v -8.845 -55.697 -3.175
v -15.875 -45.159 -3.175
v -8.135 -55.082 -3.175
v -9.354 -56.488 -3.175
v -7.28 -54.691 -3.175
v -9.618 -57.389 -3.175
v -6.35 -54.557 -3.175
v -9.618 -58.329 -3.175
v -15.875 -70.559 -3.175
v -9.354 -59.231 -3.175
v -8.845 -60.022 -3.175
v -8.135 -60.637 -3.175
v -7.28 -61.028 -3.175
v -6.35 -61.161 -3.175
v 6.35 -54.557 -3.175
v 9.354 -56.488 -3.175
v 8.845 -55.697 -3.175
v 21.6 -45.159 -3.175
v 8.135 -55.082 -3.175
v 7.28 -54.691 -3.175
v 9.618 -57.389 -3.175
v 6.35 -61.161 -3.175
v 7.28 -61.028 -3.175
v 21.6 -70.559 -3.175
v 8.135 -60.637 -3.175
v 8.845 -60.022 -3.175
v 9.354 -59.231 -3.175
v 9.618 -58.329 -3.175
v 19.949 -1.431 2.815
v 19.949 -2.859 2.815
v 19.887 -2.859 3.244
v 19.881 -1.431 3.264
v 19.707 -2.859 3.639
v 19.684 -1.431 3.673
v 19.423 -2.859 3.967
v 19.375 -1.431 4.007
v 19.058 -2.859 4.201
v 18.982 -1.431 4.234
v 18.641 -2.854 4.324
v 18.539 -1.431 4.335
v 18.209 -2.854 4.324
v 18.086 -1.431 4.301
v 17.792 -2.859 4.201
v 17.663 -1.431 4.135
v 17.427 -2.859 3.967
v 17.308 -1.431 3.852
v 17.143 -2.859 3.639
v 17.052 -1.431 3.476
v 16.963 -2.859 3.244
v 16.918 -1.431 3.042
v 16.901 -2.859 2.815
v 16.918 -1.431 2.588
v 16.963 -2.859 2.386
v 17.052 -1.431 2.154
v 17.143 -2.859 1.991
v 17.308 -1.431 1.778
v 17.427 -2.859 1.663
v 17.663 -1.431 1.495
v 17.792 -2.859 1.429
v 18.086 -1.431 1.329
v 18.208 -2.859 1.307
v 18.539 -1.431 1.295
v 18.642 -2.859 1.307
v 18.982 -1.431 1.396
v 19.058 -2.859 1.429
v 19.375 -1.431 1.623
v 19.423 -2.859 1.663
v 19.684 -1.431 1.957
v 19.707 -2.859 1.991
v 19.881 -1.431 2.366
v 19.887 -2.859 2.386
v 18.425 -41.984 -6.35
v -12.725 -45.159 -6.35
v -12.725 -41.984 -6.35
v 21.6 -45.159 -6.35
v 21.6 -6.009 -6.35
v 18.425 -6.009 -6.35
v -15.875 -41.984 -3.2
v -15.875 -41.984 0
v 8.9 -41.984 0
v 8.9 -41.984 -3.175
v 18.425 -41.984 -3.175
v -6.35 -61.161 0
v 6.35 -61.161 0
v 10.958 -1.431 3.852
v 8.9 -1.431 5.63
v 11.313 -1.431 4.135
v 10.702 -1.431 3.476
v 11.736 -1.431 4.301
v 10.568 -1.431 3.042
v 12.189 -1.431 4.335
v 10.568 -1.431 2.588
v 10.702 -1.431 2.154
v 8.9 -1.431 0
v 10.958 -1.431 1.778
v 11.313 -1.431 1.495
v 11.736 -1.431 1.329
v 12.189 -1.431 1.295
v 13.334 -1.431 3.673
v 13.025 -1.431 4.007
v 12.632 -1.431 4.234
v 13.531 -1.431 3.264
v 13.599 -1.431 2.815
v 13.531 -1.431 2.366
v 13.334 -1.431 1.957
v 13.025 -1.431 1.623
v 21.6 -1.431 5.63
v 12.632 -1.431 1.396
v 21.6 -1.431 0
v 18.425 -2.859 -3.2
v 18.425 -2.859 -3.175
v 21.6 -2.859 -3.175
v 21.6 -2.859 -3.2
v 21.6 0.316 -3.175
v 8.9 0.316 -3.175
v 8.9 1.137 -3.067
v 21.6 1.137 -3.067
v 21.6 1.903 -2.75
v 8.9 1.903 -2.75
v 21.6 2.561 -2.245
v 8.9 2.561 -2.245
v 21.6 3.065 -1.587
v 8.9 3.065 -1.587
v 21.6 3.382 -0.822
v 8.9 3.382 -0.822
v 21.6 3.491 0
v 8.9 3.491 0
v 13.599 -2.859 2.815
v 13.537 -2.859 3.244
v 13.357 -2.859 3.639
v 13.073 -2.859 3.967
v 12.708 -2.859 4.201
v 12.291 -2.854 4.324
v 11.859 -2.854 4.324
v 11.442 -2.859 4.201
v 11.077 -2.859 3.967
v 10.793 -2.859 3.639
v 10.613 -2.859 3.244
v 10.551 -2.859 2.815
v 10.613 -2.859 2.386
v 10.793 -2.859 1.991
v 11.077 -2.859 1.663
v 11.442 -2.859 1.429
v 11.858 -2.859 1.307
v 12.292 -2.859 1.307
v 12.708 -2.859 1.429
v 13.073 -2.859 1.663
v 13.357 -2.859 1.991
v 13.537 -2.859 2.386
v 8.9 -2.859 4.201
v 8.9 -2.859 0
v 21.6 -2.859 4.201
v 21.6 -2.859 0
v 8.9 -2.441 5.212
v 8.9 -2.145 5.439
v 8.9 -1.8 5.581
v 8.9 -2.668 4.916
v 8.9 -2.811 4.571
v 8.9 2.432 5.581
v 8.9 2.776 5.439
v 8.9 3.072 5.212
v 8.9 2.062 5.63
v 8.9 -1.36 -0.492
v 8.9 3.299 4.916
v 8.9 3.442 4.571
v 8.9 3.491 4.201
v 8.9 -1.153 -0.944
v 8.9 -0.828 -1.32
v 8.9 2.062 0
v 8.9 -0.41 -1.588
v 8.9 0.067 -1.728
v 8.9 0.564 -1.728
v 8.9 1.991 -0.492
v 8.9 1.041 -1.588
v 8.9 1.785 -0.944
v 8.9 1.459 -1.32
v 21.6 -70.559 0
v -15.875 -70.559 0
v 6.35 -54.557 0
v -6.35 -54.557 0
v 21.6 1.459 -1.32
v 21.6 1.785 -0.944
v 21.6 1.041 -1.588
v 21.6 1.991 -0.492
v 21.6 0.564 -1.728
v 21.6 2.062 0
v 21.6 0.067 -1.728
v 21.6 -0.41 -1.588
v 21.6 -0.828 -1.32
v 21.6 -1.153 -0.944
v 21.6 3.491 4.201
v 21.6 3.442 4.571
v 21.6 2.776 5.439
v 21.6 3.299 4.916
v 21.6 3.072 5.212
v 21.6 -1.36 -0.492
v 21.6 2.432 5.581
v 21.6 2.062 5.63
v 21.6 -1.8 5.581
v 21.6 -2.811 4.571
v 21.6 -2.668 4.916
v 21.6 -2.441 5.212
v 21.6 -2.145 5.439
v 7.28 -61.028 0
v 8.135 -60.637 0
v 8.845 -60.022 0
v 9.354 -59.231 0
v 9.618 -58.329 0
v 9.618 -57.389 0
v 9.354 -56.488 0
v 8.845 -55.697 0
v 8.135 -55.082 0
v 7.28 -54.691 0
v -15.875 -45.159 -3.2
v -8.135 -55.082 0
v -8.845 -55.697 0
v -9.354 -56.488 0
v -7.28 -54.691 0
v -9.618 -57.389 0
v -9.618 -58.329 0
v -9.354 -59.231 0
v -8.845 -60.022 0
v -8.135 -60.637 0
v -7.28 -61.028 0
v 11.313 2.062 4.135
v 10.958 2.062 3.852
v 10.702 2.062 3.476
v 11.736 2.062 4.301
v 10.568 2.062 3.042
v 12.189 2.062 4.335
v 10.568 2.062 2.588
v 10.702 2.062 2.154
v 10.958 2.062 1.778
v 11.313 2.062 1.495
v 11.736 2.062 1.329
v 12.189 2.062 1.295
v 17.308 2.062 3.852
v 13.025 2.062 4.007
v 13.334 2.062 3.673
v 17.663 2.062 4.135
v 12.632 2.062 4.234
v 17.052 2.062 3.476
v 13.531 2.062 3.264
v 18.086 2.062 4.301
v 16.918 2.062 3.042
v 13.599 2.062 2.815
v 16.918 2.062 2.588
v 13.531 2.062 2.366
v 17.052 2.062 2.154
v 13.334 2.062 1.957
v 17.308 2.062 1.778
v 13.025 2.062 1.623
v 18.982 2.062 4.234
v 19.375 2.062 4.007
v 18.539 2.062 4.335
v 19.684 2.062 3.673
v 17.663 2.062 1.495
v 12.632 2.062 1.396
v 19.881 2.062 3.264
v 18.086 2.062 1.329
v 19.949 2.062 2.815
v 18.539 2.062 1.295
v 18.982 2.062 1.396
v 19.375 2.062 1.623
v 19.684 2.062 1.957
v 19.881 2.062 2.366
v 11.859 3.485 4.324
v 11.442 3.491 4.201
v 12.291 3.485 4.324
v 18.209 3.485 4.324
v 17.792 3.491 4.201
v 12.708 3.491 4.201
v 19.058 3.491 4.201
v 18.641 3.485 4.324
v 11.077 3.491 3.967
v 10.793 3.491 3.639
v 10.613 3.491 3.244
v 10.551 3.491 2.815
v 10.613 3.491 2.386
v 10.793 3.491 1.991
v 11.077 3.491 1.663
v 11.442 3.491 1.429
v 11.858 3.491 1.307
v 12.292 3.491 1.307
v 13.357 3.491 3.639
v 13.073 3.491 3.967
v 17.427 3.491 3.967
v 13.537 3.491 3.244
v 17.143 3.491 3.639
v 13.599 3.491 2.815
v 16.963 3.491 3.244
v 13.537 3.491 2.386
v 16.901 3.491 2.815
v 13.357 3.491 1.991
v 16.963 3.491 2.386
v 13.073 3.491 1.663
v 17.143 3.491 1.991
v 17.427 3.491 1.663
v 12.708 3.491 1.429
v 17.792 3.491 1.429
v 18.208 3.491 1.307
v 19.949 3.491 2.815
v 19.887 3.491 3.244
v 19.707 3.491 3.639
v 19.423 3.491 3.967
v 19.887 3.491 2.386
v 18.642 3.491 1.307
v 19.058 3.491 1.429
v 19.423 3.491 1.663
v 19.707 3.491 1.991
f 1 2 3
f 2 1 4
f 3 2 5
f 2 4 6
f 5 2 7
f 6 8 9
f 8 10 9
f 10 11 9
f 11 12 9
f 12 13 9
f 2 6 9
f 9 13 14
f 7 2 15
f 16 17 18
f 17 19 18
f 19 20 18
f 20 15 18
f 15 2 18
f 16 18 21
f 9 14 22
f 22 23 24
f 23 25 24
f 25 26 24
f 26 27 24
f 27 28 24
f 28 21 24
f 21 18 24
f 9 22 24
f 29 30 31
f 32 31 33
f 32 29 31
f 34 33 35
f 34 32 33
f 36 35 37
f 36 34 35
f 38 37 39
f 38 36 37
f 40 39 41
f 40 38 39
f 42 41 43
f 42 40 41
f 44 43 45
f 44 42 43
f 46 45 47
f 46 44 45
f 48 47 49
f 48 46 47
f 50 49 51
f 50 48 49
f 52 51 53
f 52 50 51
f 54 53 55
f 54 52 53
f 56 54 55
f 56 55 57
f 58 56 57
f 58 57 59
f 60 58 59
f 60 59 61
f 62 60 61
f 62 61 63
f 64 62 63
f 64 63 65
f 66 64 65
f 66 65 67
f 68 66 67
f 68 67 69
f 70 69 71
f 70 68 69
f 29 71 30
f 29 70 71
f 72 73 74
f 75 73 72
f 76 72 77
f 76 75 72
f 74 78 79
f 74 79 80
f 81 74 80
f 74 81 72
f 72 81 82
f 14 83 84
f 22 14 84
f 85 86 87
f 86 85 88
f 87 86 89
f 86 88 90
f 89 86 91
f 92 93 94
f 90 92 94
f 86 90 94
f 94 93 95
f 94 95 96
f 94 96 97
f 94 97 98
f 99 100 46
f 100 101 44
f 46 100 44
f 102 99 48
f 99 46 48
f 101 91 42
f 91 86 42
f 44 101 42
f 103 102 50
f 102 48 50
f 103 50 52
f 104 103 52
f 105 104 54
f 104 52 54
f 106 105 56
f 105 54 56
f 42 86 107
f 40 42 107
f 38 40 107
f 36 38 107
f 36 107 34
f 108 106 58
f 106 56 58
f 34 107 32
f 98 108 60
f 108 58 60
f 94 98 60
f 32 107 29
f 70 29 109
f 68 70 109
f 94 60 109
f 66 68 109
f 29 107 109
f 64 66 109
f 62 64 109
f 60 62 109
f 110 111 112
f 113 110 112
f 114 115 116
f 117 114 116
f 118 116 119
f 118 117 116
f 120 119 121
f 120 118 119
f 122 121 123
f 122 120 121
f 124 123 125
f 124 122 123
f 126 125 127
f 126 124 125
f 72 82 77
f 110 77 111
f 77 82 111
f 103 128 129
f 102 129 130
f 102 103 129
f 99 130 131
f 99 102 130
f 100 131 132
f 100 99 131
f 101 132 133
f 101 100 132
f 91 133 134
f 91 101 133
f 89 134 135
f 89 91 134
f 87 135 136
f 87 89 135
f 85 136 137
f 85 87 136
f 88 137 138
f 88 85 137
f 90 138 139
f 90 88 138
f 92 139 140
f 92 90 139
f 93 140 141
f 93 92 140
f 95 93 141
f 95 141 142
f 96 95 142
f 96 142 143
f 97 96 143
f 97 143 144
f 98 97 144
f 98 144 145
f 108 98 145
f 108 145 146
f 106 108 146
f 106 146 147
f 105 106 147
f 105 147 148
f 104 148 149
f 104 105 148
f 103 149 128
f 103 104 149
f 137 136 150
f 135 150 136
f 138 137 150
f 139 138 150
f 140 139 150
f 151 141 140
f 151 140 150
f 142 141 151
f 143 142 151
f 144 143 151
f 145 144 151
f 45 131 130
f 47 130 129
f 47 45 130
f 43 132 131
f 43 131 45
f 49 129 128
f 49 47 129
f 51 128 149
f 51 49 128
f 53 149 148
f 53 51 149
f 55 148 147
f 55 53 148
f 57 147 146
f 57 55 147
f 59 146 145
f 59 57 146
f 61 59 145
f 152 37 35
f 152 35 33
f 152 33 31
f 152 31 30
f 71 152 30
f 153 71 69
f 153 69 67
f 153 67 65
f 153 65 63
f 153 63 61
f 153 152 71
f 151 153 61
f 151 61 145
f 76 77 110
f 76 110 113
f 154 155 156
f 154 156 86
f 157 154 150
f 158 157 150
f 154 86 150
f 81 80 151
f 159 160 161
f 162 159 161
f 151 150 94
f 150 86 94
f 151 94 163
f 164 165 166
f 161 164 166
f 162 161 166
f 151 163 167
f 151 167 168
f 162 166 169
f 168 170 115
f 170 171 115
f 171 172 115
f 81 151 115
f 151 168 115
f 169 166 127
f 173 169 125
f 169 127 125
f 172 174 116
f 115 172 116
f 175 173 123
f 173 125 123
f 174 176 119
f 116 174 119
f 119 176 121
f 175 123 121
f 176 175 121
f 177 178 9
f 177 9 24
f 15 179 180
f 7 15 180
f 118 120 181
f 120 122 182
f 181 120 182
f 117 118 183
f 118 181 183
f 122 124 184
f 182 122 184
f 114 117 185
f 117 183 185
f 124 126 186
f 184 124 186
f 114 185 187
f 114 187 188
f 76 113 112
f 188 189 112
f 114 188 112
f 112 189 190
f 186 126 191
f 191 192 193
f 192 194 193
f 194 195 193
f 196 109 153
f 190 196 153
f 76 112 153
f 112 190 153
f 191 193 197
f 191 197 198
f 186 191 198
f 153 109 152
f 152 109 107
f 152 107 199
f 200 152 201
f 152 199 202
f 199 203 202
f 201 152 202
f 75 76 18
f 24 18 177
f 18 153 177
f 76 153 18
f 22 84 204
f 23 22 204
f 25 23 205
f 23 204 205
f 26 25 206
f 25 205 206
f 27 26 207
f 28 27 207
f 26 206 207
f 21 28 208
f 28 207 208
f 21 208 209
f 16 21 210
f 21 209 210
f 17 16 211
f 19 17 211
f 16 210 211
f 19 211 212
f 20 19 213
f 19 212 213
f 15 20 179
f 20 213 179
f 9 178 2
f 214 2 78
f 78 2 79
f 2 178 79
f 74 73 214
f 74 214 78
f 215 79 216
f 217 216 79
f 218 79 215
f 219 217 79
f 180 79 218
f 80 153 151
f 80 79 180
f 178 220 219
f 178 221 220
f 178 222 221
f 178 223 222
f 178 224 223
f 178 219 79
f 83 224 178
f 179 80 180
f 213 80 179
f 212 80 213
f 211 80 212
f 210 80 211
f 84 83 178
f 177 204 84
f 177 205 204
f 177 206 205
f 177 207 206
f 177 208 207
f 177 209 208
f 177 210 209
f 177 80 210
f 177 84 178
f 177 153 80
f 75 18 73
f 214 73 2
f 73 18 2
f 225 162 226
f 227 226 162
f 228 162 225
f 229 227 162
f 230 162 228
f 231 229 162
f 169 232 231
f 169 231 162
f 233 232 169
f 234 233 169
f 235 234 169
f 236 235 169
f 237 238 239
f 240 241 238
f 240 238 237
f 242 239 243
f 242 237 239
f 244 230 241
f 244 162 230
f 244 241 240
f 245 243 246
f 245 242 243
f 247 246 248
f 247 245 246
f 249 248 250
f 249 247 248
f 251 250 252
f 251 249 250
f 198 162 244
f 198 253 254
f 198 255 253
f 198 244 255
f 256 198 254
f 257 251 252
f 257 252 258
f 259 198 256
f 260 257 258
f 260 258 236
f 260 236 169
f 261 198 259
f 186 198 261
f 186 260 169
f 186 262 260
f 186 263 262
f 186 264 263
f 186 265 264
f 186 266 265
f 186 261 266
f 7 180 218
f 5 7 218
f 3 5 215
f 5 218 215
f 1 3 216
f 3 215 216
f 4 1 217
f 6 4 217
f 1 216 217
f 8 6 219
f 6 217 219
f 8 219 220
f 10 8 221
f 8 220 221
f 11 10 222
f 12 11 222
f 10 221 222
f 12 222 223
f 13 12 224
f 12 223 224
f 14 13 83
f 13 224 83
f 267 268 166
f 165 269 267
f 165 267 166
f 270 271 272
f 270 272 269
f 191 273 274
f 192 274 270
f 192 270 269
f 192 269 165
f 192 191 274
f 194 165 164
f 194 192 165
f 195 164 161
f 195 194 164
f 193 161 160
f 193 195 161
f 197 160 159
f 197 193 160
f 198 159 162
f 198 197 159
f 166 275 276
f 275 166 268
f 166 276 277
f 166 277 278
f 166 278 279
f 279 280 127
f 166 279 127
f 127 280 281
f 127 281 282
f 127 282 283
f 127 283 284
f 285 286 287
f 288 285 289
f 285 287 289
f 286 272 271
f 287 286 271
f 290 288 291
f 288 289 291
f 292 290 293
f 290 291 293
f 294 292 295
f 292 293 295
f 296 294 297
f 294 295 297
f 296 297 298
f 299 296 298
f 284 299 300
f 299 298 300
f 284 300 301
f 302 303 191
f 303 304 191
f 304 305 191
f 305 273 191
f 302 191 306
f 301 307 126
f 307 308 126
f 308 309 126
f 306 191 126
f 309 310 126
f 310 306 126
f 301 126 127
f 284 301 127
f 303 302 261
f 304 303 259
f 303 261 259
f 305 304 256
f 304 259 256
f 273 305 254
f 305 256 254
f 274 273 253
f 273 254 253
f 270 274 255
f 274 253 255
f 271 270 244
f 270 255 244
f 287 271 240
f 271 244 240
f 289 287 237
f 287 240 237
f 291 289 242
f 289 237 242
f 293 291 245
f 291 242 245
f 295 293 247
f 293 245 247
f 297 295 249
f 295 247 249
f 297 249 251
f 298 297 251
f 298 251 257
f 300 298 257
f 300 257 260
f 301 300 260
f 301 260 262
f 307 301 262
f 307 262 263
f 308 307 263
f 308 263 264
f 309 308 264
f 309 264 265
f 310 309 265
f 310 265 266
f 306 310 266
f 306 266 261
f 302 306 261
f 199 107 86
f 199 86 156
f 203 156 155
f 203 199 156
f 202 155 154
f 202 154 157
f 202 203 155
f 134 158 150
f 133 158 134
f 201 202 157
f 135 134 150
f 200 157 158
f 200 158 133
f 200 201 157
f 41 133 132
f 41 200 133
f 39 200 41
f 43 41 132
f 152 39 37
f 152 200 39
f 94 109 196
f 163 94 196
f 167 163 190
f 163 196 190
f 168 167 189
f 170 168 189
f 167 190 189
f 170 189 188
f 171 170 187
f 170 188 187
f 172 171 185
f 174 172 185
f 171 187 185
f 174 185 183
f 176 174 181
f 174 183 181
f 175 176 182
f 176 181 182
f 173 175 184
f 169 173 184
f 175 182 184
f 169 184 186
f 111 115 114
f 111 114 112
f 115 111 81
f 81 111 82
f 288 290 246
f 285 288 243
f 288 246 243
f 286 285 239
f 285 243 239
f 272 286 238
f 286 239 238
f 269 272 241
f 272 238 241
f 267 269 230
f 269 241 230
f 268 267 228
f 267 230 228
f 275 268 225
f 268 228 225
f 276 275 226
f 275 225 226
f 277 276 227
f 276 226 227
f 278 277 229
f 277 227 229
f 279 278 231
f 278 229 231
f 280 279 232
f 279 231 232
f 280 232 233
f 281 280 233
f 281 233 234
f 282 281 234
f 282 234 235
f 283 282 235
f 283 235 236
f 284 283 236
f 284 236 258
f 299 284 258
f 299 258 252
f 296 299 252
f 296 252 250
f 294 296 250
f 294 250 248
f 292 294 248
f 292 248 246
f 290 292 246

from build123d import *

# Parameters (mm, degrees)
PAD003_DEPTH         = 6.35
SKETCH015_R          = 1.524
POCKET003_DEPTH      = 4.7635
POCKET003_DEPTH_BACK = 1.5885
SKETCH016_W          = 3.175
SKETCH016_H          = 12.7
PAD008_DEPTH         = 67.7
SKETCH025_W          = 28.575
SKETCH025_H          = 24.775
PAD009_DEPTH         = 3.175
POCKET007_DEPTH      = 5.175996
PAD010_DEPTH         = 3.175
CHAMFER001_SIZE      = 3.1496


with BuildPart() as part:
    # Sketch014 → Pad003 (new body, symmetric)
    with BuildSketch(Plane.YZ.offset(15.25)):
        with BuildLine():
            ThreePointArc((-1.430625, 0), (0.315625, -1.74625), (2.061875, 0))
            Line((2.061875, 5.63), (2.061875, 0))
            ThreePointArc((3.490625, 4.20125), (3.072154, 5.211529), (2.061875, 5.63))
            Line((3.490625, 4.20125), (3.490625, 0))
            ThreePointArc((0.315625, -3.175), (2.560689, -2.245064), (3.490625, 0))
            Line((-2.859375, -3.175), (0.315625, -3.175))
            Line((-2.859375, 4.20125), (-2.859375, -3.175))
            ThreePointArc((-1.430625, 5.63), (-2.440904, 5.211529), (-2.859375, 4.20125))
            Line((-1.430625, 5.63), (-1.430625, 0))
        make_face()
    extrude(amount=PAD003_DEPTH, both=True)

    # Sketch015 (on Face72 of LinearPattern001) → Pocket003 (cut, two sides)
    with BuildSketch(Plane.XZ.offset(1.271875)) as pocket003_sk:
        with Locations((12.075, 2.815)):
            Circle(SKETCH015_R)
        with Locations((18.425, 2.815)):
            Circle(SKETCH015_R)
    extrude(amount=-POCKET003_DEPTH, mode=Mode.SUBTRACT)
    extrude(pocket003_sk.sketch, amount=POCKET003_DEPTH_BACK, mode=Mode.SUBTRACT)

    # Sketch016 (on Face8 of Pocket003) → Pad008 (join)
    with BuildSketch(Plane(origin=(15.25, -2.859375, 0), x_dir=(0, 0, -1), z_dir=(0, -1, 0))):
        with Locations((1.5875, 0)):
            Rectangle(SKETCH016_W, SKETCH016_H)
    extrude(amount=PAD008_DEPTH)

    # Sketch025 (on Face16 of Pad008) → Pad009 (join)
    with BuildSketch(Plane(origin=(15.25, 0, 0), x_dir=(0, -1, 0), z_dir=(0, 0, 1))):
        with Locations((56.271875, -18.7375)):
            Rectangle(SKETCH025_W, SKETCH025_H)
    extrude(amount=-PAD009_DEPTH)

    # Sketch026 (on Face29 of Pad015) → Pocket007 (cut, through all)
    with BuildSketch(Plane(origin=(15.25, 0, 1.999996), x_dir=(0, -1, 0), z_dir=(0, 0, 1))):
        with BuildLine():
            ThreePointArc((61.161375, -8.9), (57.859375, -5.598), (54.557375, -8.9))
            Line((54.557375, -8.9), (54.557375, -21.6))
            ThreePointArc((54.557375, -21.6), (57.859375, -24.902), (61.161375, -21.6))
            Line((61.161375, -21.6), (61.161375, -8.9))
        make_face()
    extrude(amount=-POCKET007_DEPTH, mode=Mode.SUBTRACT)

    # Sketch027 (on Face24 of Pocket007) → Pad010 (join)
    with BuildSketch(Plane(origin=(15.25, 0, -3.175), x_dir=(0, 1, 0), z_dir=(0, 0, -1))):
        Polygon((-2.859375, 6.35), (-45.159375, 6.35), (-45.159375, -31.125), (-41.984375, -31.125), (-41.984375, 3.175), (-2.859375, 3.175), align=None)
    extrude(amount=PAD010_DEPTH)

    # Chamfer001
    chamfer001_edges = [part.edges().sort_by_distance(p)[0] for p in [
        (20.0125, -2.859375, -6.35),
        (-15.875, -43.571875, -6.35),
    ]]
    chamfer(chamfer001_edges, length=CHAMFER001_SIZE)


solid = part.part
